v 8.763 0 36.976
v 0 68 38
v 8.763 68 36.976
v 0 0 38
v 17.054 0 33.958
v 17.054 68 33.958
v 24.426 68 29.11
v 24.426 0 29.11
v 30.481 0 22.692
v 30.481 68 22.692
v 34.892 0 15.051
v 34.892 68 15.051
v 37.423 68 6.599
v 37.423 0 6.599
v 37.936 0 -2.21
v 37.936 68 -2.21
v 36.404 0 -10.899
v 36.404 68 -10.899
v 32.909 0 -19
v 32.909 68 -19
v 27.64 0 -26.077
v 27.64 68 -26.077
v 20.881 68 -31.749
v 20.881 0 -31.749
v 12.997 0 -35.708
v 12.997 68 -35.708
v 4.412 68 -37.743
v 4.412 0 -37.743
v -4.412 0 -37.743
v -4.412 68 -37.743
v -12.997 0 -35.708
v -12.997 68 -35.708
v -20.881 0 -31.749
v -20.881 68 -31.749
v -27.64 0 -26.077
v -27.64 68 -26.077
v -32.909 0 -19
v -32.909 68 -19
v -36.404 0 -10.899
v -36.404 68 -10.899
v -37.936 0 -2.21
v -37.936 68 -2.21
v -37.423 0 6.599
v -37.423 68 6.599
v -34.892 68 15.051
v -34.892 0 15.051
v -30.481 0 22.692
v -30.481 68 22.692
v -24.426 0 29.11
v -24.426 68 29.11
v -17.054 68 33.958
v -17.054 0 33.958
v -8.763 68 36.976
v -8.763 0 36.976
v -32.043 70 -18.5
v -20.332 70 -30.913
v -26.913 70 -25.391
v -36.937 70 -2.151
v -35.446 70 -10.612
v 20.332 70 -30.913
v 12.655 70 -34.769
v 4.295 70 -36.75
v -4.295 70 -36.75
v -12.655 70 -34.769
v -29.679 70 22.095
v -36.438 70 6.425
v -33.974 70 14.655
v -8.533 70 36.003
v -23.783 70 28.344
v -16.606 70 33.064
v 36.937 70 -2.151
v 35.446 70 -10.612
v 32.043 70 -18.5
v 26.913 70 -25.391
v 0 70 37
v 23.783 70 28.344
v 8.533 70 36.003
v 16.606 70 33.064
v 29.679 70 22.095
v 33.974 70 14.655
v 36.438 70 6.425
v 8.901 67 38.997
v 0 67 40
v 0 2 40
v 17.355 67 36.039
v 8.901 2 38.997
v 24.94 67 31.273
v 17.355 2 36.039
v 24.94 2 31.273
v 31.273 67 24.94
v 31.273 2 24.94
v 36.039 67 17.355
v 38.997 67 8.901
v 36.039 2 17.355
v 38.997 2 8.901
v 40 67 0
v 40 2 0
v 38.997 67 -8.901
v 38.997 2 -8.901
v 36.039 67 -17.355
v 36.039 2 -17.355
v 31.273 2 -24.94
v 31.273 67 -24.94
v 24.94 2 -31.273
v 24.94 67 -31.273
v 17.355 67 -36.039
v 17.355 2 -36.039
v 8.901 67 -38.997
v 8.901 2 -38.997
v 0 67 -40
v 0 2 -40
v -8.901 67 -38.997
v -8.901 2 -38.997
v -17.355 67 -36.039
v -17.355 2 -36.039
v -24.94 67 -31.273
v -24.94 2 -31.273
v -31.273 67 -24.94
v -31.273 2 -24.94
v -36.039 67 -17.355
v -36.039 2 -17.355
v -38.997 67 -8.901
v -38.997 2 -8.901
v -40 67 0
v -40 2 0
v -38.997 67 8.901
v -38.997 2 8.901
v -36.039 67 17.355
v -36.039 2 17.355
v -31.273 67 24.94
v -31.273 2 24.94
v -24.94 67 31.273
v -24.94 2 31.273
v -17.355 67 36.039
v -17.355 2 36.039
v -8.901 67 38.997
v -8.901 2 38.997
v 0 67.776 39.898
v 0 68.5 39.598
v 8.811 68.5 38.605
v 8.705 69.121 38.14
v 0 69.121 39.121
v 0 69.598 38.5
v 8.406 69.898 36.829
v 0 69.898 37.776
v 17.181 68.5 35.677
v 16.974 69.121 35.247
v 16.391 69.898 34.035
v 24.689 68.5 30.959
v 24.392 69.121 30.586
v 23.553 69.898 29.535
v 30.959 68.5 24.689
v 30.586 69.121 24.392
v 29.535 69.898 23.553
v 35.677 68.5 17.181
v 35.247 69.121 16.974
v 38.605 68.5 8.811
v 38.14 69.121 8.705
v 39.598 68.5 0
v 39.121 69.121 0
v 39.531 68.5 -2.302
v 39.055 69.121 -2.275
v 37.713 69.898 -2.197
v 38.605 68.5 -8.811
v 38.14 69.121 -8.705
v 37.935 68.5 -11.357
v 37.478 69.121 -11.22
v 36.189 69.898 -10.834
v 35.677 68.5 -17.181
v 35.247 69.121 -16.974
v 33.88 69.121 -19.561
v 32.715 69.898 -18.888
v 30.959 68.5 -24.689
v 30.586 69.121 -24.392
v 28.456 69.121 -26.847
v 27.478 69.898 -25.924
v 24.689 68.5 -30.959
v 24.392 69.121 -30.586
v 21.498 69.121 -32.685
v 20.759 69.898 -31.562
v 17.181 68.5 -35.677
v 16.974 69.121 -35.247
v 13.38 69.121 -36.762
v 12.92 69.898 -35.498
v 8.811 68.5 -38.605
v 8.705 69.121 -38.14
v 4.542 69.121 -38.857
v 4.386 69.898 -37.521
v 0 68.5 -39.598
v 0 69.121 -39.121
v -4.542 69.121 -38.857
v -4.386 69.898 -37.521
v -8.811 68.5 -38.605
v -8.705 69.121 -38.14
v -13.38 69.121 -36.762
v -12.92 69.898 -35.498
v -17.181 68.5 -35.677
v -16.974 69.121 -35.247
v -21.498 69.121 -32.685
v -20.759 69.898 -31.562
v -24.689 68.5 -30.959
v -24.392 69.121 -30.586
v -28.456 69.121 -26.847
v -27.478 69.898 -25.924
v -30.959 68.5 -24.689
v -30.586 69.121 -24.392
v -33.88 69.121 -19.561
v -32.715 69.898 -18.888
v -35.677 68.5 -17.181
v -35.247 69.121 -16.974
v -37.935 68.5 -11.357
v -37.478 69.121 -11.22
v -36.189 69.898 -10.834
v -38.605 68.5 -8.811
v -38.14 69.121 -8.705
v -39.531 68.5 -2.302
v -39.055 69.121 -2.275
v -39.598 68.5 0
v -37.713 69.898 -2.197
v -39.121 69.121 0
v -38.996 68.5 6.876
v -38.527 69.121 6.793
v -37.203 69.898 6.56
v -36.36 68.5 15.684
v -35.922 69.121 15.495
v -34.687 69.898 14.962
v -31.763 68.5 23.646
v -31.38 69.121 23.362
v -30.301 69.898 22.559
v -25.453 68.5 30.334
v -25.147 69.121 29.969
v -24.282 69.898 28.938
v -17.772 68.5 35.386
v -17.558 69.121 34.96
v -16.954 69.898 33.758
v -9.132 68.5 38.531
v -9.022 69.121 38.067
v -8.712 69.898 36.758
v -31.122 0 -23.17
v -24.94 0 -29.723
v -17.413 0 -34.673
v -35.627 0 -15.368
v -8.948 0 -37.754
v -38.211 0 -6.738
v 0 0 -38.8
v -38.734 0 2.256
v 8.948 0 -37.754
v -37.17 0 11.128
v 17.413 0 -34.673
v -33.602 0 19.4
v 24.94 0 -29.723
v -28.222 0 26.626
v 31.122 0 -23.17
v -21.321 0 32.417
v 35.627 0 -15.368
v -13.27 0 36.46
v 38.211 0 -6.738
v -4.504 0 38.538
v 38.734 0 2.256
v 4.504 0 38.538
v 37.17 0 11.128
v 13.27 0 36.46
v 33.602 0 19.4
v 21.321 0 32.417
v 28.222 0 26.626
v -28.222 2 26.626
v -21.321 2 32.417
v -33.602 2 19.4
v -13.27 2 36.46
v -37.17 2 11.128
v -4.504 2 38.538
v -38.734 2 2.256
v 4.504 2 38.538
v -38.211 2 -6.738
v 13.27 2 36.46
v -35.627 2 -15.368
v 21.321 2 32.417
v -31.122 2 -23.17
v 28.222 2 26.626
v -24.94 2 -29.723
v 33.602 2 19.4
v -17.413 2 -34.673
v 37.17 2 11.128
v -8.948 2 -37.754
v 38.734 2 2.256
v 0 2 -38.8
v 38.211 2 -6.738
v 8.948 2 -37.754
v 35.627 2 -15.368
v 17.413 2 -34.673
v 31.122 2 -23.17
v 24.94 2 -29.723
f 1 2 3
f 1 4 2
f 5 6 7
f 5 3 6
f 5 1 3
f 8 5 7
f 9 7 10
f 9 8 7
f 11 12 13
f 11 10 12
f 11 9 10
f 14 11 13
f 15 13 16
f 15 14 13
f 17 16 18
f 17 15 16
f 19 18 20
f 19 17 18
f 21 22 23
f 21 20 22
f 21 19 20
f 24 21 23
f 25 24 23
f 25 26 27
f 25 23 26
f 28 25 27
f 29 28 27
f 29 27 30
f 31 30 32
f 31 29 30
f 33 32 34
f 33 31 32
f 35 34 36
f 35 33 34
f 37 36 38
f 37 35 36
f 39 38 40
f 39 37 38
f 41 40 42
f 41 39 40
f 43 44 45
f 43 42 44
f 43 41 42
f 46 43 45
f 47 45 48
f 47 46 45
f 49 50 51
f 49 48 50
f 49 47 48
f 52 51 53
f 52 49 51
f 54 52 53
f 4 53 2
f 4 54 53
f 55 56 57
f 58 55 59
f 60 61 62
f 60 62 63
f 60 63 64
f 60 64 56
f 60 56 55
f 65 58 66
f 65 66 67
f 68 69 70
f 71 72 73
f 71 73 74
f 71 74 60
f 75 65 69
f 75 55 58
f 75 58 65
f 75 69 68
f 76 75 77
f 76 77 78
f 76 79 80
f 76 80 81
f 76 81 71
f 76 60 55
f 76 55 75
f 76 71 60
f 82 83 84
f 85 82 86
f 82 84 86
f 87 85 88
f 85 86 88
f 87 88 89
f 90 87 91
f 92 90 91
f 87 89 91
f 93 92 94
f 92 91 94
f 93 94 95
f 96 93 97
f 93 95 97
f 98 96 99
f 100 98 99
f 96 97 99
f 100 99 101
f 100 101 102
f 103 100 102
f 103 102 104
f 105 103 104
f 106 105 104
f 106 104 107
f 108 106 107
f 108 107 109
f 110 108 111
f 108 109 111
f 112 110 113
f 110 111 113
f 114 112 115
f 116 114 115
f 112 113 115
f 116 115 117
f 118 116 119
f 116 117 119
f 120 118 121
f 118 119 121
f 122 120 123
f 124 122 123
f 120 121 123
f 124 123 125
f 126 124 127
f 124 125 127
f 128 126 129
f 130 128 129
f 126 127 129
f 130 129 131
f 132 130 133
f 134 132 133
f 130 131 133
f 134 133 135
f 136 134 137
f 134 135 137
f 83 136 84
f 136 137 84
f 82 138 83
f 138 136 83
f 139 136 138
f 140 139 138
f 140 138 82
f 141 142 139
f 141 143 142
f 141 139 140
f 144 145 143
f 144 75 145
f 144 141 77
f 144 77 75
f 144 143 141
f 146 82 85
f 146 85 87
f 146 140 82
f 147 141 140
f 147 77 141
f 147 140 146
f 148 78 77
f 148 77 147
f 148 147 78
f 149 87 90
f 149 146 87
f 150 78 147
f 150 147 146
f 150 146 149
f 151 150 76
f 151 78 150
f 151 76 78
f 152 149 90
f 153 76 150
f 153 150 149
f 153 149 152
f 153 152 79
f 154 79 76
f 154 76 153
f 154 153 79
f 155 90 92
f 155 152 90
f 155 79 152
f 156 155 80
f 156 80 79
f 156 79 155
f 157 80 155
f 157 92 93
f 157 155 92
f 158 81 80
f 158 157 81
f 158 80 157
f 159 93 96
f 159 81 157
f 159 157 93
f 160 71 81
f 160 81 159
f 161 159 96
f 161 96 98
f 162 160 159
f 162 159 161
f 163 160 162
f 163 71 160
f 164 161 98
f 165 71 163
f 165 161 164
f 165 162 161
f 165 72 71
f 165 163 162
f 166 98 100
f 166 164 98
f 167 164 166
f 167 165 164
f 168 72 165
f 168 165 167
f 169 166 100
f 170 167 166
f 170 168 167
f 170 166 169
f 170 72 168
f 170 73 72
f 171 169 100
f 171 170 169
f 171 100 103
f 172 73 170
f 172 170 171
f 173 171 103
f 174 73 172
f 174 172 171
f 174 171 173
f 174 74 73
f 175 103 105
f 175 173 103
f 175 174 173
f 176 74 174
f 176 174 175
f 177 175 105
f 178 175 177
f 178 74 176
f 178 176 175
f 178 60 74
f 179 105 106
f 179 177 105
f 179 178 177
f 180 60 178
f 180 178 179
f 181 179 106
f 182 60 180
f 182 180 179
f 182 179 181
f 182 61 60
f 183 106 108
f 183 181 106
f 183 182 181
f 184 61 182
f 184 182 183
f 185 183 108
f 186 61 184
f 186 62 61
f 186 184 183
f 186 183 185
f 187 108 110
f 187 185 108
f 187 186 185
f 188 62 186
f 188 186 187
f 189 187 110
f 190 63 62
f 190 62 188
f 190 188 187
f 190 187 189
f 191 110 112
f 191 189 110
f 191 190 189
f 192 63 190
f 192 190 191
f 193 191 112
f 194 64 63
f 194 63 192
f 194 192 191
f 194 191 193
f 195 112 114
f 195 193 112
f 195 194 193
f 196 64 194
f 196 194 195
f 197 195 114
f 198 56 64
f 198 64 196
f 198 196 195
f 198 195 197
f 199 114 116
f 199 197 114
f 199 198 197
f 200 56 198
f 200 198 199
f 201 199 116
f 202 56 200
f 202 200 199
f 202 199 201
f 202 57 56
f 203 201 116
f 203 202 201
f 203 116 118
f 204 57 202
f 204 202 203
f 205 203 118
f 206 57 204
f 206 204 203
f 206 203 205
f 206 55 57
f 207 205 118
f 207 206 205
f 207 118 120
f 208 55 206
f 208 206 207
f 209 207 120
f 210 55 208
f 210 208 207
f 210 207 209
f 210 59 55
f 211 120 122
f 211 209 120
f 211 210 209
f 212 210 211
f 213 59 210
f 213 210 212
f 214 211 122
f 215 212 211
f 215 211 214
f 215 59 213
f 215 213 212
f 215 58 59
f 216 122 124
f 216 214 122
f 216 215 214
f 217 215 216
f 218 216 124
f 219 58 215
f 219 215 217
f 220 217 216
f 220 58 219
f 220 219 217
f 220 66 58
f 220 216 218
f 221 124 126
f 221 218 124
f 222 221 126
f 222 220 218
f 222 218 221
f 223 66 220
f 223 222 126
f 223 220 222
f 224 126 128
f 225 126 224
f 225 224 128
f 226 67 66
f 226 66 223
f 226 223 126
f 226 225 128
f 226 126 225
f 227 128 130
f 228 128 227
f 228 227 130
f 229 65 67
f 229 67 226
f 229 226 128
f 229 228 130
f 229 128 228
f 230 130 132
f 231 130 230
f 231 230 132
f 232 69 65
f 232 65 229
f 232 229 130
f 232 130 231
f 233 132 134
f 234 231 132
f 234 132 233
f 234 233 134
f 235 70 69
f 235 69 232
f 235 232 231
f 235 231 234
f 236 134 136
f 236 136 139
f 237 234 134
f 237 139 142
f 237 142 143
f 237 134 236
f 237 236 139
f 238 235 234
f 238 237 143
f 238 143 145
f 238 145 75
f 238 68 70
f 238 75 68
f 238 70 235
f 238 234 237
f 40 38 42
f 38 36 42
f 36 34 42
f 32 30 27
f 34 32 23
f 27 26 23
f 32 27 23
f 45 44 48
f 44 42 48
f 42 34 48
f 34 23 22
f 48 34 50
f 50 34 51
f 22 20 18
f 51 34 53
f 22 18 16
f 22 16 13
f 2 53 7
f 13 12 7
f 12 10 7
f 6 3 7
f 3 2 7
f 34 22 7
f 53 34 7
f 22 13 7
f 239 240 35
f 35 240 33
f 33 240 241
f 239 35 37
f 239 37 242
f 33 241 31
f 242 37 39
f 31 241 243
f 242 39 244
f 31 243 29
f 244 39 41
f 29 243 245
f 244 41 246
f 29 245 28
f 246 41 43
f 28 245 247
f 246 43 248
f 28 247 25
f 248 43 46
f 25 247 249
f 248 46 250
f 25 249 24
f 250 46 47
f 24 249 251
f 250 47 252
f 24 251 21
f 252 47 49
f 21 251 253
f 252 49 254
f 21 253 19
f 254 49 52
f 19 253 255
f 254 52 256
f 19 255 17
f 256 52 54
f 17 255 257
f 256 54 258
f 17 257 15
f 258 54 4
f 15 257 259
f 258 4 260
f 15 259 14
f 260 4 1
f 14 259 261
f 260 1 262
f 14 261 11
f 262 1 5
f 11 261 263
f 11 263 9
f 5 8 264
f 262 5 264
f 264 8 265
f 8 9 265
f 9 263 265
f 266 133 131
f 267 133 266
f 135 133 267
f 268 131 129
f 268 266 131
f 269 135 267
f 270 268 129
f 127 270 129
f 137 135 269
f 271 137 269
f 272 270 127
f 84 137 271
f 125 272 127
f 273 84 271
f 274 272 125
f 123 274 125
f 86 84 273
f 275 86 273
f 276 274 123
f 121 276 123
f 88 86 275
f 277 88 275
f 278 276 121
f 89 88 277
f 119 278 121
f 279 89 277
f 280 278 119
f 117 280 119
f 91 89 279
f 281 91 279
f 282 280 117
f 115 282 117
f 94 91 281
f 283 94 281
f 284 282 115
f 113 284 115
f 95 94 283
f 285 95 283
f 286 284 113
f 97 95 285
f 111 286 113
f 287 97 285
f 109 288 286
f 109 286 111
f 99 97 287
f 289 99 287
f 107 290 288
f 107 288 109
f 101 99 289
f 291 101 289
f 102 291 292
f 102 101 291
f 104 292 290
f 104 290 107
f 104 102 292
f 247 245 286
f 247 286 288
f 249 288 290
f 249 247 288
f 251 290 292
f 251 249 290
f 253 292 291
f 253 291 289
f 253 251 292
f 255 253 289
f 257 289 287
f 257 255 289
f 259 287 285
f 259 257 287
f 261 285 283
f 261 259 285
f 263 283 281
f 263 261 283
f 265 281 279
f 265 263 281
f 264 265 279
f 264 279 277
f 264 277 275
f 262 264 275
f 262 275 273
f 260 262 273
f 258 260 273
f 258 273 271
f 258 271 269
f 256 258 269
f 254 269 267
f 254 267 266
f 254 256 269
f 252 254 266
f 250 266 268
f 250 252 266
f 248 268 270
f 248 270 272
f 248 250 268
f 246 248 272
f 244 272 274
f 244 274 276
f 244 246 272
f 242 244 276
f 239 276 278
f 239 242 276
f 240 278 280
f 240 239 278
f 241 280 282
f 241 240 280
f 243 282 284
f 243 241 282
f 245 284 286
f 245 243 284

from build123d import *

# Parameters (mm, degrees)
SKETCH1_R           = 40
BOSS_EXTRUDE1_DEPTH = 70
SHELL1_T            = -2
SKETCH2_R           = 40
SKETCH2_R_2         = 38.8
CUT_EXTRUDE1_DEPTH  = 2
FILLET1_R           = 3


with BuildPart() as part:
    # Sketch1 → Boss-Extrude1 (new body)
    with BuildSketch(Plane(origin=(0, 0, 0), x_dir=(1, 0, 0), z_dir=(0, 1, 0))):
        with Locations(Location((0, 0, 0), (0, 0, 270))):
            Circle(SKETCH1_R)
    extrude(amount=BOSS_EXTRUDE1_DEPTH)

    # Shell1
    shell1_openings = [part.faces().sort_by_distance(p)[0] for p in [
        (0, 0, 0),
    ]]
    offset(amount=SHELL1_T, openings=shell1_openings, kind=Kind.INTERSECTION)

    # Sketch2 → Cut-Extrude1 (cut)
    with BuildSketch(Plane.XZ):
        with Locations(Location((0, 0, 0), (0, 0, 270))):
            Circle(SKETCH2_R)
        with Locations(Location((0, 0, 0), (0, 0, 270))):
            Circle(SKETCH2_R_2, mode=Mode.SUBTRACT)
    extrude(amount=-CUT_EXTRUDE1_DEPTH, mode=Mode.SUBTRACT)

    # Fillet1
    fillet1_edges = [part.edges().sort_by_distance(p)[0] for p in [
        (0, 70, -40),
    ]]
    fillet(fillet1_edges, radius=FILLET1_R)


solid = part.part
